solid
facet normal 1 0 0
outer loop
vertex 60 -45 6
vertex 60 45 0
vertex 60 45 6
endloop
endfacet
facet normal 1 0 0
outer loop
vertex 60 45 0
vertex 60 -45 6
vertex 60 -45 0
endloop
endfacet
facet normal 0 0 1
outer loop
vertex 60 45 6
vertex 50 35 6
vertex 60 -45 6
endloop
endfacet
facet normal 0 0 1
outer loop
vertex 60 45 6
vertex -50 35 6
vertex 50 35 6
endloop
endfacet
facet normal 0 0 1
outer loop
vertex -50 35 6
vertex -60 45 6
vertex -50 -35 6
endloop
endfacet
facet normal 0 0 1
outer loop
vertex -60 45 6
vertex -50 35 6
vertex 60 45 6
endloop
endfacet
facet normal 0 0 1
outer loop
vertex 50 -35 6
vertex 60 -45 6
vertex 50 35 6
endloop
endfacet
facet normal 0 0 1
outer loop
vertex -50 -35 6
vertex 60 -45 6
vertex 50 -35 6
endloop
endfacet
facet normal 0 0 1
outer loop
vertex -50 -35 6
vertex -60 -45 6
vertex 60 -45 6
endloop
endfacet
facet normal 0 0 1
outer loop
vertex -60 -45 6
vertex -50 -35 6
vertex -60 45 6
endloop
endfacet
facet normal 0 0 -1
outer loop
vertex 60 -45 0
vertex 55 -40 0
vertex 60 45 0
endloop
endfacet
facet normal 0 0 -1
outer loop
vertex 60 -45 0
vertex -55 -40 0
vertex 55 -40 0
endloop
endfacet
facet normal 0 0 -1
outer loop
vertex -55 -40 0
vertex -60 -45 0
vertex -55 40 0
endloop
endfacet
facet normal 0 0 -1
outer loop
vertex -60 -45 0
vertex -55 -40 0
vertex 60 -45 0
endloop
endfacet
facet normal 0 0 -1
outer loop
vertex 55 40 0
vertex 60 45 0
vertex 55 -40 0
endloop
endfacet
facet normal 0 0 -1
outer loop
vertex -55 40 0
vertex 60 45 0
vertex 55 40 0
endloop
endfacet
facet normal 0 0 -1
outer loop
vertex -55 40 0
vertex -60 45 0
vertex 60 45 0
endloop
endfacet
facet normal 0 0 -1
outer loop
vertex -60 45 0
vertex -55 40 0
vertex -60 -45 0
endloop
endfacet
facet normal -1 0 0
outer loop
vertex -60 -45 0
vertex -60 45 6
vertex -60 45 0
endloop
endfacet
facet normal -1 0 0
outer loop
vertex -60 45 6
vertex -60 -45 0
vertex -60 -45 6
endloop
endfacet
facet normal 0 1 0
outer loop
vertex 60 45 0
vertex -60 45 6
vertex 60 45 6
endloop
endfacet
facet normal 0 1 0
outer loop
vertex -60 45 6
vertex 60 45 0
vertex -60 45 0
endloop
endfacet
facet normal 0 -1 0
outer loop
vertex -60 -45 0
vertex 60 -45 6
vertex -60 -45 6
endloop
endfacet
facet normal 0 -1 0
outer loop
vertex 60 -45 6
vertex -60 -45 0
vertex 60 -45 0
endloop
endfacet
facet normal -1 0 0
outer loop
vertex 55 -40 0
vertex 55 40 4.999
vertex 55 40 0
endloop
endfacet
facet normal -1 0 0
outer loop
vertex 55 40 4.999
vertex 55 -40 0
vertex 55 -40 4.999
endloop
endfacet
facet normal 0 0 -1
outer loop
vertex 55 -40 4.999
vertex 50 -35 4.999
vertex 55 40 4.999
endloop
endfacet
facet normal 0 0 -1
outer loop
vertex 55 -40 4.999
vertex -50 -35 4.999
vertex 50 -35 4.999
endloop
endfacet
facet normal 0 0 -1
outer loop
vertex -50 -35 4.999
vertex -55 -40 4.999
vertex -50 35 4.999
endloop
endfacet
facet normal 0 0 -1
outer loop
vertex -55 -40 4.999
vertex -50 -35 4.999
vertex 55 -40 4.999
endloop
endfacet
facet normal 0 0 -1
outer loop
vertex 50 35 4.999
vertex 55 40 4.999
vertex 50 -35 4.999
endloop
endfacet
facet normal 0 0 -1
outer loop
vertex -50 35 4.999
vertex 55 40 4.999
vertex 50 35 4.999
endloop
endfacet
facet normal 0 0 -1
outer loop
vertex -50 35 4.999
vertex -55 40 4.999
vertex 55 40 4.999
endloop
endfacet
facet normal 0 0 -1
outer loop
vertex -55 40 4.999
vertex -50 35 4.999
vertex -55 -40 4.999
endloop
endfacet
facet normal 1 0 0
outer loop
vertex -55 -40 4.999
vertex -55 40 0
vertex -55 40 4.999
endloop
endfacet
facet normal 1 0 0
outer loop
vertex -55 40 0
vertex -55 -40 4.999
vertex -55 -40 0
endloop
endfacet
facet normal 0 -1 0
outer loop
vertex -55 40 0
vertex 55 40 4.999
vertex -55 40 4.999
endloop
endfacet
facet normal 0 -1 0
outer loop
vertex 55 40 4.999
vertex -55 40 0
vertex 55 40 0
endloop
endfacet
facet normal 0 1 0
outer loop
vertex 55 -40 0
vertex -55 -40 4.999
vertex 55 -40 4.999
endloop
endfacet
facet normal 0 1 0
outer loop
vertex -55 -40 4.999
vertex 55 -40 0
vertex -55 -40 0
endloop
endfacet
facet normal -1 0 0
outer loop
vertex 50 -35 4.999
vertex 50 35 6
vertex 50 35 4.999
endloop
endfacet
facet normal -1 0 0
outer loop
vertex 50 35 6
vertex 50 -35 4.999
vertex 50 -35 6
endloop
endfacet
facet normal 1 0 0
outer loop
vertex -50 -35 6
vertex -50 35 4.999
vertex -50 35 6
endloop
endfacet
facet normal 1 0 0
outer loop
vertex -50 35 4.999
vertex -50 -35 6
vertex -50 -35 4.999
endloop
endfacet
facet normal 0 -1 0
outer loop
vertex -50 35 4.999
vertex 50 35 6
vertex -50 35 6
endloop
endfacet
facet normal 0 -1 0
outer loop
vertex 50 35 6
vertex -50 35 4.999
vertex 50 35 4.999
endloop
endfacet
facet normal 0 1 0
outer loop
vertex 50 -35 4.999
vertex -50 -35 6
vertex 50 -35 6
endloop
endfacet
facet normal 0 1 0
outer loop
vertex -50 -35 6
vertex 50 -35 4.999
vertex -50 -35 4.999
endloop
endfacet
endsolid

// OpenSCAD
part = "sleeve"; // [holder:Holder,sleeve:Sleeve]

width = 100; //[10:0.1:250]
length = 70; //[10:0.1:250]
height = 1.5; //[0.1:0.1:5]
inset = 0.5; //[0.1:0.1:5]
border = 5; //[1:0.5:10]
base = 5; //[1:0.1:10]
sleeve = 5; //[1:0.1:10]

if (part == "holder") {
 translate([0, 0, (base) / 2])
  difference(){
   cube([width + (border * 2), length + (border * 2), base],  true);
   translate([0, 0, (base - inset + 0.001) / 2])
    cube([width, length, inset + 0.001], true);
  }
} else if (part == "sleeve") {
 //rotate([0, 180, 0])
 difference(){
  translate([0,0,(base + (height - inset)) / 2])
   cube(
    [width + (border * 2) + (sleeve * 2),
     length + (border * 2) + (sleeve * 2),
     base + height - inset], true);
   translate([0, 0, (base - 0.001) / 2])
    cube([width + (border * 2), length + (border * 2), base],  true);
   translate([0, 0, (base + height + inset + 0.001) / 2])  
    cube([width, length,  base + height + inset + 0.001], true);
 }
}
